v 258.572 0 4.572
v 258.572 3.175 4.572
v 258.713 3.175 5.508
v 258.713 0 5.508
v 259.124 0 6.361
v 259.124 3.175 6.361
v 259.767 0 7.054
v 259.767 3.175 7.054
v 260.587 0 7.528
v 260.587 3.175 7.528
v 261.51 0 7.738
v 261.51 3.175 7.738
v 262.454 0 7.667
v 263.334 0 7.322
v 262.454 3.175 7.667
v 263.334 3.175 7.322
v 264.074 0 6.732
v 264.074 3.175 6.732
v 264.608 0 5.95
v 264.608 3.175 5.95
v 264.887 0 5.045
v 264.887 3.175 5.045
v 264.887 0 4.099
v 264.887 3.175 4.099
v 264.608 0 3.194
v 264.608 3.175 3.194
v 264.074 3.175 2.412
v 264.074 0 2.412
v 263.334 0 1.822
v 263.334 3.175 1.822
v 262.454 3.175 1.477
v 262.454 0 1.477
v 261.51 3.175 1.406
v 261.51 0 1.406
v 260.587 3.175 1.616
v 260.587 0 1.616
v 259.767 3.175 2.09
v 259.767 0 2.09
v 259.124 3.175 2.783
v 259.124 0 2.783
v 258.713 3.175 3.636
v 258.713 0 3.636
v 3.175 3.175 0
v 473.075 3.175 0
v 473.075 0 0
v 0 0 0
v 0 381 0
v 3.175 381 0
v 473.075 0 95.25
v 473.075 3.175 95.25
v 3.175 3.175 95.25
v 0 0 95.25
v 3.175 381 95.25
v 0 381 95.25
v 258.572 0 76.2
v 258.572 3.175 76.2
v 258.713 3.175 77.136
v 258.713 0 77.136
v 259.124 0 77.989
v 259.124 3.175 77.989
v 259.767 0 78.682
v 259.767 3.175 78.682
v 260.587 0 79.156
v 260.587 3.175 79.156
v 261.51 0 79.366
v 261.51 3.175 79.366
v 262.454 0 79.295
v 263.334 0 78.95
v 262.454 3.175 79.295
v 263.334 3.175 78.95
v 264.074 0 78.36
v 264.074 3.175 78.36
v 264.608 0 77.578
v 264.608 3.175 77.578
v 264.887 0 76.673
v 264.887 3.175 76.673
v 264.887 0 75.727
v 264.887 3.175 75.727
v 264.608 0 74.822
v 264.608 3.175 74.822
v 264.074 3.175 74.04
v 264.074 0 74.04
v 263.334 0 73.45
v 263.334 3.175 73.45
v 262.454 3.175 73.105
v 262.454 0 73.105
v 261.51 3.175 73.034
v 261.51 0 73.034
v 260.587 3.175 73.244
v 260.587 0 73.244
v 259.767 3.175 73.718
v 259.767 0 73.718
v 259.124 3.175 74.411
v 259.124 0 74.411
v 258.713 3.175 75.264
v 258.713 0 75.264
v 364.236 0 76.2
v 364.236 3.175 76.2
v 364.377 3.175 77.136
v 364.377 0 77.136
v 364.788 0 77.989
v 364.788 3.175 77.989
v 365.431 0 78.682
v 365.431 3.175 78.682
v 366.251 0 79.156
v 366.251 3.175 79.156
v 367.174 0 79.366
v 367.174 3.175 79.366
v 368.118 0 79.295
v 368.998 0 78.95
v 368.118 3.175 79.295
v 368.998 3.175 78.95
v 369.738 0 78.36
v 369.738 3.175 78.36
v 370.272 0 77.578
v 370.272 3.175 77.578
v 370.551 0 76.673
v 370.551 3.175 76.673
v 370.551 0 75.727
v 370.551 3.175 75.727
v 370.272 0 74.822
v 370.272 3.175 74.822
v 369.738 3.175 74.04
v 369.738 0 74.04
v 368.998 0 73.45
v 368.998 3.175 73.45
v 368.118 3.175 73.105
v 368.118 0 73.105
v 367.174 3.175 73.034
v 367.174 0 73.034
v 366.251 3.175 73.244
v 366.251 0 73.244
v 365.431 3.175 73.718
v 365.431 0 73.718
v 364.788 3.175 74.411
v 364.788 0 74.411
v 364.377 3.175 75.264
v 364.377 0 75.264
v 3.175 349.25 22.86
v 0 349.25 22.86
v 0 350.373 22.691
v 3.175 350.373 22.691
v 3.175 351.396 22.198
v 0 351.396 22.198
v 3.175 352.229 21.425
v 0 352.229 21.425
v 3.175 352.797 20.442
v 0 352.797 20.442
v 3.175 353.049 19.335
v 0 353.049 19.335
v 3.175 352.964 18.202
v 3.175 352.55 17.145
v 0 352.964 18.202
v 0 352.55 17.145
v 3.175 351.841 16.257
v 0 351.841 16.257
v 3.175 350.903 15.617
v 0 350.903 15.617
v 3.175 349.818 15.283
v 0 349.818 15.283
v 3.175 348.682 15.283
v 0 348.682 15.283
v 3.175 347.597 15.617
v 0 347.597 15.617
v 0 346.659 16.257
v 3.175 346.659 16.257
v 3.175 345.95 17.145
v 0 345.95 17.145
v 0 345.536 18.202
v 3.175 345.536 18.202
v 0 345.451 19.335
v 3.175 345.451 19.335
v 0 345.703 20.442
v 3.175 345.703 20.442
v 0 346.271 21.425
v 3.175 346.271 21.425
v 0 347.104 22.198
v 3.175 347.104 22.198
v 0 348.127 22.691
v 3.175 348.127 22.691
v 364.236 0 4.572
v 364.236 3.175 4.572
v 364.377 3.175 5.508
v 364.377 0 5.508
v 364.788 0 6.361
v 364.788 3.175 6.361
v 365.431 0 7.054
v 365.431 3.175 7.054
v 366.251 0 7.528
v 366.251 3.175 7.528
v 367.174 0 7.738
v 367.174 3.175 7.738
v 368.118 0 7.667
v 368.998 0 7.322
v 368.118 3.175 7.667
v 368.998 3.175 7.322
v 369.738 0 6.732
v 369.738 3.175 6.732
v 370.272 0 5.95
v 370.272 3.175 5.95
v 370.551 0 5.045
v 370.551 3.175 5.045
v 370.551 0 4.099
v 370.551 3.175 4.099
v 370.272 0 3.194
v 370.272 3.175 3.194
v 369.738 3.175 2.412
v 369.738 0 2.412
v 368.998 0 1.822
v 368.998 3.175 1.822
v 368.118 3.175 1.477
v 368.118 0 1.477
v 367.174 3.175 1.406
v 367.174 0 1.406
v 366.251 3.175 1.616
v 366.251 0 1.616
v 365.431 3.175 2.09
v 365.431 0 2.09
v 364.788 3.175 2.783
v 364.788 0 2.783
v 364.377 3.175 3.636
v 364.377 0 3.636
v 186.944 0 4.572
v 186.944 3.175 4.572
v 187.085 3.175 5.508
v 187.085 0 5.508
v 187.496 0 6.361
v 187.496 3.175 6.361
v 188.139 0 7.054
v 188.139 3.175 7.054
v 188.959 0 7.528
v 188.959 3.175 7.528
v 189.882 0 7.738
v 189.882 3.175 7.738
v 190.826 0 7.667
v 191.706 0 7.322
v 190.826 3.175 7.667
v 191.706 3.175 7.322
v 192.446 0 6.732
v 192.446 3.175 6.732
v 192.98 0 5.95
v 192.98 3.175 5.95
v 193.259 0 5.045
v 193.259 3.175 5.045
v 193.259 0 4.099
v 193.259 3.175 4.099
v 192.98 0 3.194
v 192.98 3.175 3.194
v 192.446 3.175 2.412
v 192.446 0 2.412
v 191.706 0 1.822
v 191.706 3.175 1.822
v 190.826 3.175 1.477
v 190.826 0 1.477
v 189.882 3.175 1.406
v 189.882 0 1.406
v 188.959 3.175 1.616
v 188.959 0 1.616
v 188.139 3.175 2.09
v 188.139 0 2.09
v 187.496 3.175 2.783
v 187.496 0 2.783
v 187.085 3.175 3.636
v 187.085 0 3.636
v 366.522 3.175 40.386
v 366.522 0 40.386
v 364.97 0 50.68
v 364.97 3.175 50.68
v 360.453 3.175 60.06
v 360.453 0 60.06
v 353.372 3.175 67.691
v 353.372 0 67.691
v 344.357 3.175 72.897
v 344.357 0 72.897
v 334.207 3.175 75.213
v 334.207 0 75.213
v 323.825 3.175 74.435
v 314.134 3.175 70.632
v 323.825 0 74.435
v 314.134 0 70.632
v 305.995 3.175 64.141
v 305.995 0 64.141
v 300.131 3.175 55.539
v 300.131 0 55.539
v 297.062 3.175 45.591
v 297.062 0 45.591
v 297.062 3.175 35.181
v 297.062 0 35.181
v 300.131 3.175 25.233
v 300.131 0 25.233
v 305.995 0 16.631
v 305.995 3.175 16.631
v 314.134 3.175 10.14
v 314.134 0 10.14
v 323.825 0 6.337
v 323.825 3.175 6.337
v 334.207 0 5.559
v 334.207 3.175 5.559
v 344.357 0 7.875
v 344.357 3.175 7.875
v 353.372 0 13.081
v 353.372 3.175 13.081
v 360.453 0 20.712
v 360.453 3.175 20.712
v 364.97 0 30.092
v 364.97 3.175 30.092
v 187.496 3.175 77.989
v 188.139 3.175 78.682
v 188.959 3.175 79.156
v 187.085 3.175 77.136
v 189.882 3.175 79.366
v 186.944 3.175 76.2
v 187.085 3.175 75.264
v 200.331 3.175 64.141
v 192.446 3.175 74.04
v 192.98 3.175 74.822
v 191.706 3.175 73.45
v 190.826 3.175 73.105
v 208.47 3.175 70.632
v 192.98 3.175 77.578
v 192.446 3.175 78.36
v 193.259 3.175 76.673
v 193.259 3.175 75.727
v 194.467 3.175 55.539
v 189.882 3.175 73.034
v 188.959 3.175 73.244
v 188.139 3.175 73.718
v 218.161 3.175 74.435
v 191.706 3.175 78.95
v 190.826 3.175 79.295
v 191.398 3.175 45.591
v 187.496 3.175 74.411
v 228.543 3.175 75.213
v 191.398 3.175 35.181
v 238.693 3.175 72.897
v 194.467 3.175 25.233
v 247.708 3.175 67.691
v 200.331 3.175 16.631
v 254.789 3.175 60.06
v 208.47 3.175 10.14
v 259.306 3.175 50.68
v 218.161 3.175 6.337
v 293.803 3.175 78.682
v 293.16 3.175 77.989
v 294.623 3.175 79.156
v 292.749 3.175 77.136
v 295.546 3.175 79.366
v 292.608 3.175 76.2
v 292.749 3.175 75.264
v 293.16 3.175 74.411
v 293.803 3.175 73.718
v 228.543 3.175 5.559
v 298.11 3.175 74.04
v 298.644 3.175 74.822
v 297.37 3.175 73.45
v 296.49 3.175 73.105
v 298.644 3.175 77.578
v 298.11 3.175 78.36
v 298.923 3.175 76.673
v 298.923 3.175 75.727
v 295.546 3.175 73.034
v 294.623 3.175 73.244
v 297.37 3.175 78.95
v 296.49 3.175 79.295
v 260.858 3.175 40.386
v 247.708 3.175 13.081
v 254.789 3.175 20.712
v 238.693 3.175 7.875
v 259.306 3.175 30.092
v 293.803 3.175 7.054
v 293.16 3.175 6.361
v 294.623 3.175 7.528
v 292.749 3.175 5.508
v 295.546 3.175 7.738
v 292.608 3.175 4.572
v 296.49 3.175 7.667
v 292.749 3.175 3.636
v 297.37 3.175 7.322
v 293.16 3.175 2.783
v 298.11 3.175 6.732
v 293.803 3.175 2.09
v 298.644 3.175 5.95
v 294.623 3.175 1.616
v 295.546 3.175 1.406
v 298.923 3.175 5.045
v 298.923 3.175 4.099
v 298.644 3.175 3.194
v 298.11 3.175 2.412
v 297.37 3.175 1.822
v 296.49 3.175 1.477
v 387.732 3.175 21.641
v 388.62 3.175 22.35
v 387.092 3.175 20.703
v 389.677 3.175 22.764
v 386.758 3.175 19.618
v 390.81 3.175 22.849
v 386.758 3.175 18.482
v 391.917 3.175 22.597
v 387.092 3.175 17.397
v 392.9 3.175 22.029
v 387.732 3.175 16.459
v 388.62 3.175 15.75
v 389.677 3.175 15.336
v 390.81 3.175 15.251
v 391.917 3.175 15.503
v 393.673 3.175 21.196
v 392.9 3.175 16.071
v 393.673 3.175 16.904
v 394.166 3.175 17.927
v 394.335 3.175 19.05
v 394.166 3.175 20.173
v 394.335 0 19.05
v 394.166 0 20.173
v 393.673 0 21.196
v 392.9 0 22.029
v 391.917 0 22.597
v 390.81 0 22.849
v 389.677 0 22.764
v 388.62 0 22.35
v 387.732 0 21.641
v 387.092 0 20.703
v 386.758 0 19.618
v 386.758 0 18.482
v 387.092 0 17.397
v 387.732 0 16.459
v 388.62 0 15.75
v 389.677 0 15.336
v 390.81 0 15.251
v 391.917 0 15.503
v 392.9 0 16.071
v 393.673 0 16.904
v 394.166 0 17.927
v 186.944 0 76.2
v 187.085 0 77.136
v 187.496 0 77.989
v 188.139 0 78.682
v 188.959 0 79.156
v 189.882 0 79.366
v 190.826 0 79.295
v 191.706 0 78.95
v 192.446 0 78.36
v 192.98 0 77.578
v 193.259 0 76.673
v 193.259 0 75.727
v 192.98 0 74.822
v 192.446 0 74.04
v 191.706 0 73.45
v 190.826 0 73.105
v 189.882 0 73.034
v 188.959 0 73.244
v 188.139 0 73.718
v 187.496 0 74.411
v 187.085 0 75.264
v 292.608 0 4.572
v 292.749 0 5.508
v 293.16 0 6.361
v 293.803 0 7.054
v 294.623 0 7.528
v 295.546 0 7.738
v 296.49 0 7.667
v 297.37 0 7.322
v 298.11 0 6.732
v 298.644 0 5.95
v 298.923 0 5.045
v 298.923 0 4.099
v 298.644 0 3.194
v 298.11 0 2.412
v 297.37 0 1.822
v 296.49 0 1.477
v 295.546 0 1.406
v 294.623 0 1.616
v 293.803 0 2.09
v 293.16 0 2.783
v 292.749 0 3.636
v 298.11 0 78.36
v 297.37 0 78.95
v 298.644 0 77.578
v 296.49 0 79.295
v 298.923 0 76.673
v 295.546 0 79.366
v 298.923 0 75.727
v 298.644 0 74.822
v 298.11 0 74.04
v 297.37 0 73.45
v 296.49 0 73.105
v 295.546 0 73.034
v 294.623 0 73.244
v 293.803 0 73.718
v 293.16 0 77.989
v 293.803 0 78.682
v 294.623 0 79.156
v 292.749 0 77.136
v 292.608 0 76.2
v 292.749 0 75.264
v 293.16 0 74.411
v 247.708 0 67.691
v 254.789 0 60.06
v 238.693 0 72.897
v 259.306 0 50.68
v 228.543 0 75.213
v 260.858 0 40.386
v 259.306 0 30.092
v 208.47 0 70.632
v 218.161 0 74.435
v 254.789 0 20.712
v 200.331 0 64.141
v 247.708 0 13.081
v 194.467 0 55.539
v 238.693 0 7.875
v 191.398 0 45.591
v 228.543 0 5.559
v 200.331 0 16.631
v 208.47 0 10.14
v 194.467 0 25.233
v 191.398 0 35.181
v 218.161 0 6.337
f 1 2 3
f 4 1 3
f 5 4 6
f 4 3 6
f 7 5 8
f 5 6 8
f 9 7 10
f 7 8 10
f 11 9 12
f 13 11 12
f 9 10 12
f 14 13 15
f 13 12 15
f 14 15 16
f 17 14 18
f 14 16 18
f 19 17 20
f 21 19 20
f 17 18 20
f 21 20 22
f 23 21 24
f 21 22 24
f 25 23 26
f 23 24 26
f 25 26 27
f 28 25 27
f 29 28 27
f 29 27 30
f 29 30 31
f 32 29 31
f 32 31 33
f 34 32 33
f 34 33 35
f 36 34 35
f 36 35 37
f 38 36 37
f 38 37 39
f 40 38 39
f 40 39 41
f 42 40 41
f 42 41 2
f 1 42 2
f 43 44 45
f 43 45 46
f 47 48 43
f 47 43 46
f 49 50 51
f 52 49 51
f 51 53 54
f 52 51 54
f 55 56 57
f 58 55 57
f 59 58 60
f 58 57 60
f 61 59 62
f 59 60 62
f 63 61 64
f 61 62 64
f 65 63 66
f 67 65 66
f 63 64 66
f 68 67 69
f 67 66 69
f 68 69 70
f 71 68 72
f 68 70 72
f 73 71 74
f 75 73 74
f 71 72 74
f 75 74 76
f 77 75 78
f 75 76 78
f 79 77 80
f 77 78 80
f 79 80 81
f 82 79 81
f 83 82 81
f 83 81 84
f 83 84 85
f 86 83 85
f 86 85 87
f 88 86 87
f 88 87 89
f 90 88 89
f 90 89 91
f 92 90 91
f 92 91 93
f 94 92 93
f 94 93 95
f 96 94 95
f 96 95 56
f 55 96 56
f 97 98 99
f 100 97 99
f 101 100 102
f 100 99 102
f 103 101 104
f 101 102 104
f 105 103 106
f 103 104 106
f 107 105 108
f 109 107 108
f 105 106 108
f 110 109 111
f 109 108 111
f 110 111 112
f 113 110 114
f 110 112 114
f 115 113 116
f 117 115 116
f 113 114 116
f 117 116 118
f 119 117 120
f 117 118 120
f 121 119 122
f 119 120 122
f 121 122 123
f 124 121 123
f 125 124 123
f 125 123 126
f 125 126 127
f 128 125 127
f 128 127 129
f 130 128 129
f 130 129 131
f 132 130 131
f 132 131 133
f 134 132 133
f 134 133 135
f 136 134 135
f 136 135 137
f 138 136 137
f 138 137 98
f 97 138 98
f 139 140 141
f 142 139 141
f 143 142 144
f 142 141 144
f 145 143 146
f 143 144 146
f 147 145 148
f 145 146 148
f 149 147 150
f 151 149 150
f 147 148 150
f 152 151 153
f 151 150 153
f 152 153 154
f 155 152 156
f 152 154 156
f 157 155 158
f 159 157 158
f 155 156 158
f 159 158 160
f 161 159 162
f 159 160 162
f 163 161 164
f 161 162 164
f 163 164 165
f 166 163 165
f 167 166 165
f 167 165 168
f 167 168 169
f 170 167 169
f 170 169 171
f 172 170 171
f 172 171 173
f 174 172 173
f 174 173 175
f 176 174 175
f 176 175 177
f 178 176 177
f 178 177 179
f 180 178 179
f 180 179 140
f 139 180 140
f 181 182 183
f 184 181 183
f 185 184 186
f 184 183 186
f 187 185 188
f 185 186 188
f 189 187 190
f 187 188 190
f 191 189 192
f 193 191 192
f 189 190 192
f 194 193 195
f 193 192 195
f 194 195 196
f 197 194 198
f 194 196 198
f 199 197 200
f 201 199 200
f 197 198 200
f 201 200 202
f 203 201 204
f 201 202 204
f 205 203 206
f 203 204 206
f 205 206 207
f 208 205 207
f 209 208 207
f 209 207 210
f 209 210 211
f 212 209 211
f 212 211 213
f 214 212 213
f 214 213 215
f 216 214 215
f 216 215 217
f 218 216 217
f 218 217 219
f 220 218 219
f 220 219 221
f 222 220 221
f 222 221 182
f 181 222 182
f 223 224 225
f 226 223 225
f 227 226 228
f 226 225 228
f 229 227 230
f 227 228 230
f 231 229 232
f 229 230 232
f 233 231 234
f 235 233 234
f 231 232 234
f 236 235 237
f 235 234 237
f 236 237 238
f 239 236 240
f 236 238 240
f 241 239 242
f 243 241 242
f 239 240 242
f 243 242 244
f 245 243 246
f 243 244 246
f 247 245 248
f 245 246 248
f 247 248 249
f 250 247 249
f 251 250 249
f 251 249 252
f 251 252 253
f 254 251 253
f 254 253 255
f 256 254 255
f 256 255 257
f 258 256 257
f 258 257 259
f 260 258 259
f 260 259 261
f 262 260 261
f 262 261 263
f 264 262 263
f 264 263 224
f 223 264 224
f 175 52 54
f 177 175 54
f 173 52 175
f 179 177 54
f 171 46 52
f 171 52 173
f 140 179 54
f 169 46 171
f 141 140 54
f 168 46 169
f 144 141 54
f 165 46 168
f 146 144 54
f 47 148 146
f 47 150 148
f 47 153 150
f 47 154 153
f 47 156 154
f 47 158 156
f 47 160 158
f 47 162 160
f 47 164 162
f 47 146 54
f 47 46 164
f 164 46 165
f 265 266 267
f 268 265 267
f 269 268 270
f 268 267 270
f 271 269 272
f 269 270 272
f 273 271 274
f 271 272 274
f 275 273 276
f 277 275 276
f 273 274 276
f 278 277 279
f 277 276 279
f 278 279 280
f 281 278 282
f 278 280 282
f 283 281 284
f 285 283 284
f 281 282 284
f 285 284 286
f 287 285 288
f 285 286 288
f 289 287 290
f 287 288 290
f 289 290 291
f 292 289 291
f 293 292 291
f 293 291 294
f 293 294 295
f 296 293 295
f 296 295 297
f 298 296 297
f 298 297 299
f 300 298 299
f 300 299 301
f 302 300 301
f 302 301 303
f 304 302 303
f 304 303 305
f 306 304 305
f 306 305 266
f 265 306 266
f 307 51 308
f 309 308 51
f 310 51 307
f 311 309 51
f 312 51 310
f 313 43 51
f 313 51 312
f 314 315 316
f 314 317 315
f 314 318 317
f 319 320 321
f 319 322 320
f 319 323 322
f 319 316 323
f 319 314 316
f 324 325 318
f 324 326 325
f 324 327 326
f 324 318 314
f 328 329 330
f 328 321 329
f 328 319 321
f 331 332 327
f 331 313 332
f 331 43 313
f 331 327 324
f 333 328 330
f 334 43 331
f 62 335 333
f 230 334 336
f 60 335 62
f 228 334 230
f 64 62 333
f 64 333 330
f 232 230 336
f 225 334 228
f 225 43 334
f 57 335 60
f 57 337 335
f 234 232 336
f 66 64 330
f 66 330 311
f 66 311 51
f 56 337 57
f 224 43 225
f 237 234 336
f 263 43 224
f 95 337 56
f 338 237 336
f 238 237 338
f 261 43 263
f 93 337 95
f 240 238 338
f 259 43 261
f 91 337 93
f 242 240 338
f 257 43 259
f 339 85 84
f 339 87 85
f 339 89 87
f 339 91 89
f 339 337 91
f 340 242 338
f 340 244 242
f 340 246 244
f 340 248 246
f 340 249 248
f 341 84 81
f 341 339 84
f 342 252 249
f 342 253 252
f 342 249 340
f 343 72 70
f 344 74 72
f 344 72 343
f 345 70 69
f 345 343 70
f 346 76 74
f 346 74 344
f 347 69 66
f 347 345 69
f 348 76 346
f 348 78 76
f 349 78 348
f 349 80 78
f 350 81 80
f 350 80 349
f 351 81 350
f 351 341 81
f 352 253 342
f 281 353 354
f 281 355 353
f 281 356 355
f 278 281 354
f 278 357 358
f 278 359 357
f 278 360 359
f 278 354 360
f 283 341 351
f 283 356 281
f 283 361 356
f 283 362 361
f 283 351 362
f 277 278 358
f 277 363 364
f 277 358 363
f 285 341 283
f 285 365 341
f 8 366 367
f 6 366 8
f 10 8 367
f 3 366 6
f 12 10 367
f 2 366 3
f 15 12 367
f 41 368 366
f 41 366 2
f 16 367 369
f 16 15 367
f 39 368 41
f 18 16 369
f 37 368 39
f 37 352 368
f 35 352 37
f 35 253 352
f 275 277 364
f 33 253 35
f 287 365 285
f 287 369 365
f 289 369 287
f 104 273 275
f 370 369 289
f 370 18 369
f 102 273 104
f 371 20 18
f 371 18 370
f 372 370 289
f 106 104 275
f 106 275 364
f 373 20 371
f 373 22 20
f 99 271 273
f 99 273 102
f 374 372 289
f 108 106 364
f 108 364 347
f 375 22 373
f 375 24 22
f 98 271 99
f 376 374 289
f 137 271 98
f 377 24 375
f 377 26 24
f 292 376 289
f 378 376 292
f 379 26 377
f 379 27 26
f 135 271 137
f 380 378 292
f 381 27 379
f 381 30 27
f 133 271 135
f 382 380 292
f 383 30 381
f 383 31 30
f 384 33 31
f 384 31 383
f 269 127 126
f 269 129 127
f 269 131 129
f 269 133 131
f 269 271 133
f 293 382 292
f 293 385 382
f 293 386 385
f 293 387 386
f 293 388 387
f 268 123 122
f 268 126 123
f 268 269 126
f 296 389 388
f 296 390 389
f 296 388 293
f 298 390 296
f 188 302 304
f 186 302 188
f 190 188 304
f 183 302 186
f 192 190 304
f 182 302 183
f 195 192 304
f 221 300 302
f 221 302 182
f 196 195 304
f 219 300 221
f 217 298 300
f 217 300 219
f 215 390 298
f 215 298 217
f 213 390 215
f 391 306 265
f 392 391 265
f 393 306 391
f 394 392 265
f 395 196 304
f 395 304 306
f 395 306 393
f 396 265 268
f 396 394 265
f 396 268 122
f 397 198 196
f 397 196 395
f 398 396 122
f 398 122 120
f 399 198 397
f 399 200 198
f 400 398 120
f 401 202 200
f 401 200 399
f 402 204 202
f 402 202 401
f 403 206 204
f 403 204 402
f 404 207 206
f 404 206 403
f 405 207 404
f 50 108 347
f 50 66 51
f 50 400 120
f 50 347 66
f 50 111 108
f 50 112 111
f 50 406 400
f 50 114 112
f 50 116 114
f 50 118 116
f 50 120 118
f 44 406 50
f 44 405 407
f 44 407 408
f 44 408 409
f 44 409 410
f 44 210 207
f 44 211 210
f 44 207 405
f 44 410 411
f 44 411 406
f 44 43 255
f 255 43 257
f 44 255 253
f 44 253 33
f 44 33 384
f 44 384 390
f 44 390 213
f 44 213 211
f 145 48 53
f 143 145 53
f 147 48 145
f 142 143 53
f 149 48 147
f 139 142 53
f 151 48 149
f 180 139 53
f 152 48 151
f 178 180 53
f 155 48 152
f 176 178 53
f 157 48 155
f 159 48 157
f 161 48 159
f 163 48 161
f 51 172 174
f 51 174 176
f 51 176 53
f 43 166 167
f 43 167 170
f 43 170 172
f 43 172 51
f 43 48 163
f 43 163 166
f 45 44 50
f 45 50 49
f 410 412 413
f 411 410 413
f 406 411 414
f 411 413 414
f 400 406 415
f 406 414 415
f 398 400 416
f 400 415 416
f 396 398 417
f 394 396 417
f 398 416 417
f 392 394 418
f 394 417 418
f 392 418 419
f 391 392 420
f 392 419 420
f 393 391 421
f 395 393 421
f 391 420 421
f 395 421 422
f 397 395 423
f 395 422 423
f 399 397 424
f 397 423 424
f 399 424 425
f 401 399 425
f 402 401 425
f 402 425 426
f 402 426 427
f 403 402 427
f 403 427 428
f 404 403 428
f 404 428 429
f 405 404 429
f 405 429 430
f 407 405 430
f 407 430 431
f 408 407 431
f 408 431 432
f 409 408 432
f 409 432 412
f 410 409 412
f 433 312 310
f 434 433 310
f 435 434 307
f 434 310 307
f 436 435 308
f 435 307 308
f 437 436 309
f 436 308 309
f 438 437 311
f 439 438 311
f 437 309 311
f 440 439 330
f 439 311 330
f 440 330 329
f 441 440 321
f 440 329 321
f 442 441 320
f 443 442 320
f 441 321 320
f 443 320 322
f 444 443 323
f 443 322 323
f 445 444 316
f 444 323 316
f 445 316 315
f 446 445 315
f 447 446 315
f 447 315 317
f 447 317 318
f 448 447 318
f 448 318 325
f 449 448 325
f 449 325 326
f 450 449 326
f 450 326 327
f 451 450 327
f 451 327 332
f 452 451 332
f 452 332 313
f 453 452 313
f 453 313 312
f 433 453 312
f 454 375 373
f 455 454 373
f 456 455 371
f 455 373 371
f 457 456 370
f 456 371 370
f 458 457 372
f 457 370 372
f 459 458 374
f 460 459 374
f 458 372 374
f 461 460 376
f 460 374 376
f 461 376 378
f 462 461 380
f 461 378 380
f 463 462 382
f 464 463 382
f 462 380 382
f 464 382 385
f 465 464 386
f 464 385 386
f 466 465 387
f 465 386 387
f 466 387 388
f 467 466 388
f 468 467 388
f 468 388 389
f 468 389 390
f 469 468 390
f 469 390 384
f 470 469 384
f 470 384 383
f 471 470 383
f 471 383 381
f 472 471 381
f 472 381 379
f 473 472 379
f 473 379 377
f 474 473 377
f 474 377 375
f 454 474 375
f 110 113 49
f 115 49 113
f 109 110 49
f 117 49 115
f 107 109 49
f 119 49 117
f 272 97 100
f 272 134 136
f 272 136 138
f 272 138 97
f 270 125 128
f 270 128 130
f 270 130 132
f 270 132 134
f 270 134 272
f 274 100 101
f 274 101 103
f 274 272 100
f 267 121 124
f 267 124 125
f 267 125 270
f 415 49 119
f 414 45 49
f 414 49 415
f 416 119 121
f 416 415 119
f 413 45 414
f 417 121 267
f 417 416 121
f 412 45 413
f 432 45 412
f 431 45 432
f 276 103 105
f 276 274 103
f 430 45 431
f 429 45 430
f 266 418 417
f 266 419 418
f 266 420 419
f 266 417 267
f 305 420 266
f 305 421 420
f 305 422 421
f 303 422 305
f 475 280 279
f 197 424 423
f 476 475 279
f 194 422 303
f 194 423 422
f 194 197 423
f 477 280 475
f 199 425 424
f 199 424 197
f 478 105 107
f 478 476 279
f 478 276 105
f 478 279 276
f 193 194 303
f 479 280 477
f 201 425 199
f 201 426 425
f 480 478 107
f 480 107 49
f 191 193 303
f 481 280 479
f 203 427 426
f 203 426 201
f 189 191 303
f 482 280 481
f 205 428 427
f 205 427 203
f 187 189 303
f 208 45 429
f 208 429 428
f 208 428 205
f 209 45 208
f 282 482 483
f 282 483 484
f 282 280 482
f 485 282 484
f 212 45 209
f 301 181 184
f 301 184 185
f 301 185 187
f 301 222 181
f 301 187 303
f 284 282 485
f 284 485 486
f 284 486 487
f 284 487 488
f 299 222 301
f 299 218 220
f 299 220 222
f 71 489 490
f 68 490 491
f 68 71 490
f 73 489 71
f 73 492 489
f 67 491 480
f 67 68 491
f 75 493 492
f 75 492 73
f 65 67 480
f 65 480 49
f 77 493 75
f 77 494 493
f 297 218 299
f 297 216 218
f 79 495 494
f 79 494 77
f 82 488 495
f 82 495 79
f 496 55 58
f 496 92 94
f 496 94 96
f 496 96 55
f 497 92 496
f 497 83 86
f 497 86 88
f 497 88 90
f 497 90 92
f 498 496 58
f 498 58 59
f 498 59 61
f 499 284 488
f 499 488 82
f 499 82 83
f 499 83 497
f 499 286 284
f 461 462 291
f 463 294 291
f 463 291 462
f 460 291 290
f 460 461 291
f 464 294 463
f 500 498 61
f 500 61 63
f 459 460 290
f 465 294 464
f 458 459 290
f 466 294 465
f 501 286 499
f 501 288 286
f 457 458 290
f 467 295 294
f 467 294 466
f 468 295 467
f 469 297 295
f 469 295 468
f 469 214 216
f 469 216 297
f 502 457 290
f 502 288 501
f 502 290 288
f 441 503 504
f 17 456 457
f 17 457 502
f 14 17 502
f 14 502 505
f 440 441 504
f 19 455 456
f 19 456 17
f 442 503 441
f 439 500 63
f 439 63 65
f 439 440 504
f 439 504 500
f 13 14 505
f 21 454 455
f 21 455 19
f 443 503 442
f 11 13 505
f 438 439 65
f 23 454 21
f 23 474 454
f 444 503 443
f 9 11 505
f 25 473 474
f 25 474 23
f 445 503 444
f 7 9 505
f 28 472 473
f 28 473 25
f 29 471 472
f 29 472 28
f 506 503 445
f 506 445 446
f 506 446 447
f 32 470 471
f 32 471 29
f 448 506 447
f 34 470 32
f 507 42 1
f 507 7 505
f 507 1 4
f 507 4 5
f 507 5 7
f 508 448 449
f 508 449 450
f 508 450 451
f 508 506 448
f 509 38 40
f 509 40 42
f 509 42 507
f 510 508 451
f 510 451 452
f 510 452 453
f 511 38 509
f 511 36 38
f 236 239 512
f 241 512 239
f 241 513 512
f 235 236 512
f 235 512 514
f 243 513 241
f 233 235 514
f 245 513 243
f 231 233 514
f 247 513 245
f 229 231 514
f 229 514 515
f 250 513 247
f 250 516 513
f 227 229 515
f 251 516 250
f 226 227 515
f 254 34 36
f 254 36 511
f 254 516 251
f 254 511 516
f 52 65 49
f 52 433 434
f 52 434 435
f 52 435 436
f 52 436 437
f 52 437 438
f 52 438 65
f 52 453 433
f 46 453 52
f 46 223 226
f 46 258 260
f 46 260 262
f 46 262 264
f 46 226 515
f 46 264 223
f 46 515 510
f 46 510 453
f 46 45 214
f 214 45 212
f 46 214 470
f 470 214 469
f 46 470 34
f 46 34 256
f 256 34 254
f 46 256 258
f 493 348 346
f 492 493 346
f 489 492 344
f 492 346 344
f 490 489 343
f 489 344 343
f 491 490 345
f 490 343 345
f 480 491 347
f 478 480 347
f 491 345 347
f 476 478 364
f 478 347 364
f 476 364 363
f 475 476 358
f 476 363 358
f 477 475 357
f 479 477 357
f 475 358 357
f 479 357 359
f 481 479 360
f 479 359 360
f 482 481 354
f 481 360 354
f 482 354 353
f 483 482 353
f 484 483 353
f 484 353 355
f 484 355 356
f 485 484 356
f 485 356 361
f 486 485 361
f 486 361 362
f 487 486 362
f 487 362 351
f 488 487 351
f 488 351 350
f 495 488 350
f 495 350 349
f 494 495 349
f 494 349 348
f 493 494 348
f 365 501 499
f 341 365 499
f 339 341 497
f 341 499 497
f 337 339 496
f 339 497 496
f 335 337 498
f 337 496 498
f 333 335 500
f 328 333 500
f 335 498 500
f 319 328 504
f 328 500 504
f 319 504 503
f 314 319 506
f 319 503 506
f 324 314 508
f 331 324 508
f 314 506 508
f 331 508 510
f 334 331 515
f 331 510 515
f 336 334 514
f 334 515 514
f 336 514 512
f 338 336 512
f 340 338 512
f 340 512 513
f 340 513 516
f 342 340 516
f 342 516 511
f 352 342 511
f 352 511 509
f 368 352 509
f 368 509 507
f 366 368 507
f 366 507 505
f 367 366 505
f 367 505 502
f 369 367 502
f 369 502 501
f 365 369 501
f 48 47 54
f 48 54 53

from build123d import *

# Parameters (mm, degrees)
BOSS_EXTRUDE1_DEPTH = 95.25
SKETCH2_R           = 3.175
CUT_EXTRUDE1_DEPTH  = 152.4
SKETCH4_R           = 34.925
SKETCH4_R_2         = 3.81
CUT_EXTRUDE2_DEPTH  = 381
SKETCH5_R           = 3.81
CUT_EXTRUDE3_DEPTH  = 12.7


with BuildPart() as part:
    # Sketch1 → Boss-Extrude1 (new body)
    with BuildSketch(Plane.XY):
        Polygon((0, 0), (0, 381), (3.175, 381), (3.175, 3.175), (473.075, 3.175), (473.075, 0), align=None)
    extrude(amount=BOSS_EXTRUDE1_DEPTH)

    # Sketch2 → Cut-Extrude1 (cut)
    with BuildSketch(Plane(origin=(0, 3.175, 0), x_dir=(1, 0, 0), z_dir=(0, 1, 0))):
        with Locations(Location((190.119, -4.572, 0), (0, 0, 180))):
            Circle(SKETCH2_R)
        with Locations(Location((190.119, -76.2, 0), (0, 0, 180))):
            Circle(SKETCH2_R)
        with Locations(Location((261.747, -4.572, 0), (0, 0, 180))):
            Circle(SKETCH2_R)
        with Locations(Location((261.747, -76.2, 0), (0, 0, 180))):
            Circle(SKETCH2_R)
        with Locations(Location((295.783, -76.2, 0), (0, 0, 180))):
            Circle(SKETCH2_R)
        with Locations(Location((295.783, -4.572, 0), (0, 0, 180))):
            Circle(SKETCH2_R)
        with Locations(Location((367.411, -76.2, 0), (0, 0, 180))):
            Circle(SKETCH2_R)
        with Locations(Location((367.411, -4.572, 0), (0, 0, 180))):
            Circle(SKETCH2_R)
    extrude(amount=-CUT_EXTRUDE1_DEPTH, mode=Mode.SUBTRACT)

    # Sketch4 → Cut-Extrude2 (cut)
    with BuildSketch(Plane.XZ):
        with Locations((225.933, 40.386)):
            Circle(SKETCH4_R)
        with Locations((331.597, 40.386)):
            Circle(SKETCH4_R)
        with Locations((390.525, 19.05)):
            Circle(SKETCH4_R_2)
    extrude(amount=-CUT_EXTRUDE2_DEPTH, mode=Mode.SUBTRACT)

    # Sketch5 → Cut-Extrude3 (cut)
    with BuildSketch(Plane.ZY):
        with Locations((19.05, 349.25)):
            Circle(SKETCH5_R)
    extrude(amount=-CUT_EXTRUDE3_DEPTH, mode=Mode.SUBTRACT)


solid = part.part
